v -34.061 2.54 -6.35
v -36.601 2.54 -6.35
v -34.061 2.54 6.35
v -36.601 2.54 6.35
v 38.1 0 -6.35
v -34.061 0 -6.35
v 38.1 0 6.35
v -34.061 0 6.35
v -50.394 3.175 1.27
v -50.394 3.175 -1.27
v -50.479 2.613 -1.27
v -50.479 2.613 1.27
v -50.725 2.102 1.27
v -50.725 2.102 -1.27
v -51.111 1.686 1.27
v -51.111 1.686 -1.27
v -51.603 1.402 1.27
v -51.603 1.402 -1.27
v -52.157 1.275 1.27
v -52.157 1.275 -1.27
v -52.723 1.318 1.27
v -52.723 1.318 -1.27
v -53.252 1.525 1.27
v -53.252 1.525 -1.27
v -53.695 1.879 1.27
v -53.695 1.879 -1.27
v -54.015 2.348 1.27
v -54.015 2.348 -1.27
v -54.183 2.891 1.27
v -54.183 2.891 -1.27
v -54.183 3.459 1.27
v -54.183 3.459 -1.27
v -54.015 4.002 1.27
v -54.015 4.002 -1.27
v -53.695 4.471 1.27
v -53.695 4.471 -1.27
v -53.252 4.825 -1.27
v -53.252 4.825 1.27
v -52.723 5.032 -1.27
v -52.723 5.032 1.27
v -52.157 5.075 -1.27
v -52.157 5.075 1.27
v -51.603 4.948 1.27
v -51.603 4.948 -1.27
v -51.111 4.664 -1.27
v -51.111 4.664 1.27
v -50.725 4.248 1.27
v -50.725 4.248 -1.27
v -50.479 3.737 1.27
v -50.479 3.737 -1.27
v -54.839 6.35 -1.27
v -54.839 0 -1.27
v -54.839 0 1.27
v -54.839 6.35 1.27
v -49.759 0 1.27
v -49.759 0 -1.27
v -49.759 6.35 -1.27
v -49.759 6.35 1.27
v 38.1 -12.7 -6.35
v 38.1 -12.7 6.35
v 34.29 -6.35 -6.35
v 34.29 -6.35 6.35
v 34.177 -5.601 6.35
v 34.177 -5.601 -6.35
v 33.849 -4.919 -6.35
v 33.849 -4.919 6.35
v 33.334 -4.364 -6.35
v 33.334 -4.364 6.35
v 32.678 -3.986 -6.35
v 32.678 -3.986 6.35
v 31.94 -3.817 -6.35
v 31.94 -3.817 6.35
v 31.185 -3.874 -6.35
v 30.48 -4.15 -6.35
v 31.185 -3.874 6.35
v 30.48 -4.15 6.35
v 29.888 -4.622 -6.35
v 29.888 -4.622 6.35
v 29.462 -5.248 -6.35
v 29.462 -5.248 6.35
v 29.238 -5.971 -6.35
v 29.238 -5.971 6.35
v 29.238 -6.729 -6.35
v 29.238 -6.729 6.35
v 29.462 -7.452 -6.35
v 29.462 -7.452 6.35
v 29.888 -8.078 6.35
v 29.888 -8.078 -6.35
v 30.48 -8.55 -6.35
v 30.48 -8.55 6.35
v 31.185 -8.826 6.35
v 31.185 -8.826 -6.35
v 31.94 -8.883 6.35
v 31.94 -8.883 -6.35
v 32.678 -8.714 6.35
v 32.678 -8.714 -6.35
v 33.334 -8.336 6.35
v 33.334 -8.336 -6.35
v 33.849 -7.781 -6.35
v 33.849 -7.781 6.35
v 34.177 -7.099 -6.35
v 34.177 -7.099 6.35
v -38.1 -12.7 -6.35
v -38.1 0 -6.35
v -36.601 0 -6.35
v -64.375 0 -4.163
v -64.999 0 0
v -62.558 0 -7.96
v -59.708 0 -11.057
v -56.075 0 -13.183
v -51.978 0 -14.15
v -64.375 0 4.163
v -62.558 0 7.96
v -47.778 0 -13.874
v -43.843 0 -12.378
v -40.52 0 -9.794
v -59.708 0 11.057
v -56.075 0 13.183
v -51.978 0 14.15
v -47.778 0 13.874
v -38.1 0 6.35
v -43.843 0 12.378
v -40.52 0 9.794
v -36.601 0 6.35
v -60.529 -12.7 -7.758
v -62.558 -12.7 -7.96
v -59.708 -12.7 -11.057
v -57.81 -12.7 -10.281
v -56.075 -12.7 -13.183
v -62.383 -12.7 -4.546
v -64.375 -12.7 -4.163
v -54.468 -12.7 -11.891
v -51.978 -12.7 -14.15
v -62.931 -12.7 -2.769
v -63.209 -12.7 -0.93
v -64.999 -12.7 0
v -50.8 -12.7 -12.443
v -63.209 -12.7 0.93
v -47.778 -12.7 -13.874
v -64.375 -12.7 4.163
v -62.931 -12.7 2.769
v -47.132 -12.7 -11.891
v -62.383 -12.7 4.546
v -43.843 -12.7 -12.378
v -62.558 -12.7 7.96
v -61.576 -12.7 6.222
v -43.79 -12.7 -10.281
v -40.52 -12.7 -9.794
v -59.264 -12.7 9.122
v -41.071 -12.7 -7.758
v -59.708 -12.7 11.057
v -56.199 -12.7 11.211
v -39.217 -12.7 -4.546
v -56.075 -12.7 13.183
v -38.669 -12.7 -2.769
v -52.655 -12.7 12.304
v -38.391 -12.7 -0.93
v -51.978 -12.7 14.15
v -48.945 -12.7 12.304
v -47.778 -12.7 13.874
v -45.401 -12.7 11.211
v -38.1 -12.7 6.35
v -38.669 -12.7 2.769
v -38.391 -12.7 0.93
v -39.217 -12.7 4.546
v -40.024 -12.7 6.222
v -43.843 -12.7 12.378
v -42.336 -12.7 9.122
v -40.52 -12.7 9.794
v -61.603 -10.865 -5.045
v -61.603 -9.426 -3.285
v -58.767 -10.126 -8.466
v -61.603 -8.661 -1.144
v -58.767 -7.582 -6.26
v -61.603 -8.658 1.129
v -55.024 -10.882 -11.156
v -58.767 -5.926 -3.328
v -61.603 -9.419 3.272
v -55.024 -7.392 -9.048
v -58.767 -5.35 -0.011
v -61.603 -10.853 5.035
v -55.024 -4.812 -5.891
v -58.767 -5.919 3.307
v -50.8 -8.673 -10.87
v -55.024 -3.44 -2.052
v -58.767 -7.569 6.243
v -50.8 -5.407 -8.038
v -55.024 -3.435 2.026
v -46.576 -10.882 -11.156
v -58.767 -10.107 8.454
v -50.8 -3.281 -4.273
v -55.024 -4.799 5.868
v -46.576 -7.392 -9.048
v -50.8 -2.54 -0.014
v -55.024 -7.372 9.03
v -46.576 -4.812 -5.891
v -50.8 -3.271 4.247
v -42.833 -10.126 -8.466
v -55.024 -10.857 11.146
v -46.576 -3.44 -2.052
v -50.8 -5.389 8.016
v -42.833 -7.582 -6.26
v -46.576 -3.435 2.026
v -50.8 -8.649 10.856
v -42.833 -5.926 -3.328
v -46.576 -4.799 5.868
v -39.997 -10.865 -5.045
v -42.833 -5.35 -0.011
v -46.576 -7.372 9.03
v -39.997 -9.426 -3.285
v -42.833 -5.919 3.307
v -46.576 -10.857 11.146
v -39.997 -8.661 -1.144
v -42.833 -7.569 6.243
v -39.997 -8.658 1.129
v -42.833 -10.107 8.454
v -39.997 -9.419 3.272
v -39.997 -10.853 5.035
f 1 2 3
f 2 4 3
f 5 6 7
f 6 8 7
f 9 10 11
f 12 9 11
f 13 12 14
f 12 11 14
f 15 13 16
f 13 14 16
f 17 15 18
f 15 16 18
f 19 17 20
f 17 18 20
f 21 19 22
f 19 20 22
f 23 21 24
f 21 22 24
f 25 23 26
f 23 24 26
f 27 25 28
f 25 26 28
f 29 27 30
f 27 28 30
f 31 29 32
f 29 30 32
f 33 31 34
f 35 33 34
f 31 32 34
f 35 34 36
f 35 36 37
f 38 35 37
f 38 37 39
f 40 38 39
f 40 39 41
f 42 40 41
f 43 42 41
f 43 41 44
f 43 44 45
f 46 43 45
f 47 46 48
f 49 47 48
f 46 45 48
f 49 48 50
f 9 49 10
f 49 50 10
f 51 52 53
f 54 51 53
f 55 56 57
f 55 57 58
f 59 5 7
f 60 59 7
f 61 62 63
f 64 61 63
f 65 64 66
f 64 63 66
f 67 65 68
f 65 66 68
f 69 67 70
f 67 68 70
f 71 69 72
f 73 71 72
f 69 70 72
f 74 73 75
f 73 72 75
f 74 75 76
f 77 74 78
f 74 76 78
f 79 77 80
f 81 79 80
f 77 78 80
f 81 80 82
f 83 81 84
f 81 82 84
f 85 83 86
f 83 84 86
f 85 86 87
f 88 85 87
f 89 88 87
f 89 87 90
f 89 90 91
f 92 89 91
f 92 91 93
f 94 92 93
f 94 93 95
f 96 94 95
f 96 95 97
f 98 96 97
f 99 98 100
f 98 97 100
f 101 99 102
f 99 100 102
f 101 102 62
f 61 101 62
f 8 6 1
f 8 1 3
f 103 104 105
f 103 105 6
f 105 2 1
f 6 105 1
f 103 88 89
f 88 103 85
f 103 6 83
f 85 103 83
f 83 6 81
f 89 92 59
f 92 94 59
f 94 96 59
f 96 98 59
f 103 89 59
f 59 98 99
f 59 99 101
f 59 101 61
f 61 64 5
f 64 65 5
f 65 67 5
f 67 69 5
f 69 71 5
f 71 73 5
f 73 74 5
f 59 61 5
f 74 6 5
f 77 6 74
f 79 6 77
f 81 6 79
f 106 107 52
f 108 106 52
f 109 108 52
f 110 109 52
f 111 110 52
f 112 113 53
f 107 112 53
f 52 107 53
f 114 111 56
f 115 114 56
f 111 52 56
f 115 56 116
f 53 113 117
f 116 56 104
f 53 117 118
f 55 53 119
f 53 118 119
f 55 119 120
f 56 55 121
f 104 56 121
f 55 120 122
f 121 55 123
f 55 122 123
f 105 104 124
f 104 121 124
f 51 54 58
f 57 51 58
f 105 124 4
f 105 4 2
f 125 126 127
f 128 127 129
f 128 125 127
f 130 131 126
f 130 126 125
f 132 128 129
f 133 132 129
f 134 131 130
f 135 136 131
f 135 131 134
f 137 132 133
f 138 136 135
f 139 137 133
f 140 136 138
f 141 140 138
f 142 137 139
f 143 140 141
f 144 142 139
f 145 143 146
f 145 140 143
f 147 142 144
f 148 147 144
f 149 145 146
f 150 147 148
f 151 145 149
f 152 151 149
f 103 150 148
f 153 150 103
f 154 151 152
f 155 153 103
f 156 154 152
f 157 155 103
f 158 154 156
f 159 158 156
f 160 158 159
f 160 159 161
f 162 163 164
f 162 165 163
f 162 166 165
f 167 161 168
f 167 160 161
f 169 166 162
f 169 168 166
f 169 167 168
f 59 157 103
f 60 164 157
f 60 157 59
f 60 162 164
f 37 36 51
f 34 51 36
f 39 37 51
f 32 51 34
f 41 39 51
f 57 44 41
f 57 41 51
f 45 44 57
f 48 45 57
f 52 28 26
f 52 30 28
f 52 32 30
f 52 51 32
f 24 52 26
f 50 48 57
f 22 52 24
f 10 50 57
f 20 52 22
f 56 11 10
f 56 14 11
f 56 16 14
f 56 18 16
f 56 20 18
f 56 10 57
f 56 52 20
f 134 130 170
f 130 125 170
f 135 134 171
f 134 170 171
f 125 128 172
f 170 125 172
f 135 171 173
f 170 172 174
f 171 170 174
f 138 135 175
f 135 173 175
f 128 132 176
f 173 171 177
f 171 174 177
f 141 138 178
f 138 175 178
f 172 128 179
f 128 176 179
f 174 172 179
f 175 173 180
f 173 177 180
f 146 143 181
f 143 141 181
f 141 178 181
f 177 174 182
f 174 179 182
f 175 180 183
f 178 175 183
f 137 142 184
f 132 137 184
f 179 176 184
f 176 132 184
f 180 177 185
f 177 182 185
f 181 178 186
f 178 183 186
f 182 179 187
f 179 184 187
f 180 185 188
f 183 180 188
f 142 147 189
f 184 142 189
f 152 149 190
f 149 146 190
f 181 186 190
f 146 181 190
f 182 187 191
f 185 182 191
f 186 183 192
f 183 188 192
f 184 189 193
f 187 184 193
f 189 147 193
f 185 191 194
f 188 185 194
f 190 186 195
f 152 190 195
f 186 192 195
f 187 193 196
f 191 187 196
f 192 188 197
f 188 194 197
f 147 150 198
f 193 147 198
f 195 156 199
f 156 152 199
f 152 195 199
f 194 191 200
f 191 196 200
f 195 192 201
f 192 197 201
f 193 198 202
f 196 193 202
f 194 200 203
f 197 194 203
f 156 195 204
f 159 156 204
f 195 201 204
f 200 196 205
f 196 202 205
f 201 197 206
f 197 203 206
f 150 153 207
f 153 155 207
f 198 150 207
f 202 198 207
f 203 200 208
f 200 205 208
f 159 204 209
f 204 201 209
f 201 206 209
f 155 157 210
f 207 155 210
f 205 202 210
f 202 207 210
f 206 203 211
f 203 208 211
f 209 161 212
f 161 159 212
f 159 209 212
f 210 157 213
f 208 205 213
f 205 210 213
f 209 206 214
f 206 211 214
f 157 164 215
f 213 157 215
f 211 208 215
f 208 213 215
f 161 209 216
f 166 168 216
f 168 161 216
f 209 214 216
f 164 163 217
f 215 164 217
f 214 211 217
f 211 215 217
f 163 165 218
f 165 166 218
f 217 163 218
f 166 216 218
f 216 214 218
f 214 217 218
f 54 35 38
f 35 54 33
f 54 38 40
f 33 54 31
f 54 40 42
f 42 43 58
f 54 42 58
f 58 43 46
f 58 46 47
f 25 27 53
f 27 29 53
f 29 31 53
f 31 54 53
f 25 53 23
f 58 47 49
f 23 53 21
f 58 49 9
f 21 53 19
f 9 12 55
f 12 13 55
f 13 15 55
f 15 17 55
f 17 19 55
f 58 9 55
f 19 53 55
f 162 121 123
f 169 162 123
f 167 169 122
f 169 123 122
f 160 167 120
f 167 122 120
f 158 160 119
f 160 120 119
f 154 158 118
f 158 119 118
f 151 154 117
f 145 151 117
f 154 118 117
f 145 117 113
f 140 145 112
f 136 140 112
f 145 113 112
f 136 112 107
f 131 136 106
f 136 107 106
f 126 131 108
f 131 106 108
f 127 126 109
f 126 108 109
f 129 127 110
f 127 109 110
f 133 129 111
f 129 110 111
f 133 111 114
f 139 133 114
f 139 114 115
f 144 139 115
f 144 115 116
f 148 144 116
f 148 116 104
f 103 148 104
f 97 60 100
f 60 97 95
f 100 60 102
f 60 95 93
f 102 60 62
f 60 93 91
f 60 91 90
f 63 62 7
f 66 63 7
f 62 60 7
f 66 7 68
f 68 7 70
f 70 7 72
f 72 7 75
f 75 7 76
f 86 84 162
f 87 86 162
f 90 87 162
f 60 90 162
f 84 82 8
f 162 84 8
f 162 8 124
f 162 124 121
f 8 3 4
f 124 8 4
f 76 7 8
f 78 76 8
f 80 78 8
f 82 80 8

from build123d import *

# Parameters (mm, degrees)
F1_DEPTH  = 12.7
F6_DEPTH  = 12.7
F7_R      = 2.54
F8_DEPTH  = 12.7
F9_W      = 5.08
F9_H      = 2.54
F10_DEPTH = 6.35
F11_R     = 1.905
F12_DEPTH = 2.54
F14_DEPTH = 2.54


with BuildPart() as f1:
    # F0 (on Front) → F1 (new body)
    with BuildSketch(Plane.XZ):
        with BuildLine():
            ThreePointArc((-36.6009683429, 0), (-36.9808067883, 3.2622689922), (-38.1, 6.35))
            ThreePointArc((-38.1, 6.35), (-64.9990316571, 0), (-38.1, -6.35))
            ThreePointArc((-38.1, -6.35), (-36.9808067883, -3.2622689922), (-36.6009683429, 0))
        make_face()
    extrude(amount=F1_DEPTH)

    # F4 (on offset) → F5 (revolve, cut)
    with BuildSketch(Plane.XZ.offset(15.24)):
        with BuildLine():
            ThreePointArc((-63.5, 0), (-50.8, -12.7), (-38.1, 0))
            Line((-38.1, 0), (-63.5, 0))
        make_face()
    revolve(axis=Axis((-49.9650985003, -15.24, 0), (1, 0, 0)), mode=Mode.SUBTRACT)

    # F0 (on Front) → F6 (join)
    with BuildSketch(Plane.XZ):
        with BuildLine():
            Line((38.1, -6.35), (38.1, 6.35))
            Line((38.1, 6.35), (-38.1, 6.35))
            ThreePointArc((-38.1, 6.35), (-36.9808067883, 3.2622689922), (-36.6009683429, 0))
            ThreePointArc((-36.6009683429, 0), (-36.9808067883, -3.2622689922), (-38.1, -6.35))
            Line((-38.1, -6.35), (38.1, -6.35))
        make_face()
    extrude(amount=F6_DEPTH)

    # F7 (on face) → F8 (cut)
    with BuildSketch(Plane.XY.offset(6.35)):
        with Locations((31.75, -6.35)):
            Circle(F7_R)
    extrude(amount=-F8_DEPTH, mode=Mode.SUBTRACT)

    # F9 (on face) → F10 (join)
    with BuildSketch(Plane.XZ):
        with Locations((-52.2990316571, 0)):
            Rectangle(F9_W, F9_H)
    extrude(amount=-F10_DEPTH)

    # F11 (on face) → F12 (cut)
    with BuildSketch(Plane(origin=(0, 0, -1.27), x_dir=(1, 0, 0), z_dir=(0, 0, -1))):
        with Locations((-52.2990316571, -3.175)):
            Circle(F11_R)
    extrude(amount=-F12_DEPTH, mode=Mode.SUBTRACT)

    # F13 (on face) → F14 (join)
    with BuildSketch(Plane.XZ):
        Polygon((-36.6009683429, 0), (-36.6009683429, -6.35), (-34.0609683429, -6.35), (-34.0609683429, 6.35), (-36.6009683429, 6.35), align=None)
    extrude(amount=-F14_DEPTH)


solid = f1.part
